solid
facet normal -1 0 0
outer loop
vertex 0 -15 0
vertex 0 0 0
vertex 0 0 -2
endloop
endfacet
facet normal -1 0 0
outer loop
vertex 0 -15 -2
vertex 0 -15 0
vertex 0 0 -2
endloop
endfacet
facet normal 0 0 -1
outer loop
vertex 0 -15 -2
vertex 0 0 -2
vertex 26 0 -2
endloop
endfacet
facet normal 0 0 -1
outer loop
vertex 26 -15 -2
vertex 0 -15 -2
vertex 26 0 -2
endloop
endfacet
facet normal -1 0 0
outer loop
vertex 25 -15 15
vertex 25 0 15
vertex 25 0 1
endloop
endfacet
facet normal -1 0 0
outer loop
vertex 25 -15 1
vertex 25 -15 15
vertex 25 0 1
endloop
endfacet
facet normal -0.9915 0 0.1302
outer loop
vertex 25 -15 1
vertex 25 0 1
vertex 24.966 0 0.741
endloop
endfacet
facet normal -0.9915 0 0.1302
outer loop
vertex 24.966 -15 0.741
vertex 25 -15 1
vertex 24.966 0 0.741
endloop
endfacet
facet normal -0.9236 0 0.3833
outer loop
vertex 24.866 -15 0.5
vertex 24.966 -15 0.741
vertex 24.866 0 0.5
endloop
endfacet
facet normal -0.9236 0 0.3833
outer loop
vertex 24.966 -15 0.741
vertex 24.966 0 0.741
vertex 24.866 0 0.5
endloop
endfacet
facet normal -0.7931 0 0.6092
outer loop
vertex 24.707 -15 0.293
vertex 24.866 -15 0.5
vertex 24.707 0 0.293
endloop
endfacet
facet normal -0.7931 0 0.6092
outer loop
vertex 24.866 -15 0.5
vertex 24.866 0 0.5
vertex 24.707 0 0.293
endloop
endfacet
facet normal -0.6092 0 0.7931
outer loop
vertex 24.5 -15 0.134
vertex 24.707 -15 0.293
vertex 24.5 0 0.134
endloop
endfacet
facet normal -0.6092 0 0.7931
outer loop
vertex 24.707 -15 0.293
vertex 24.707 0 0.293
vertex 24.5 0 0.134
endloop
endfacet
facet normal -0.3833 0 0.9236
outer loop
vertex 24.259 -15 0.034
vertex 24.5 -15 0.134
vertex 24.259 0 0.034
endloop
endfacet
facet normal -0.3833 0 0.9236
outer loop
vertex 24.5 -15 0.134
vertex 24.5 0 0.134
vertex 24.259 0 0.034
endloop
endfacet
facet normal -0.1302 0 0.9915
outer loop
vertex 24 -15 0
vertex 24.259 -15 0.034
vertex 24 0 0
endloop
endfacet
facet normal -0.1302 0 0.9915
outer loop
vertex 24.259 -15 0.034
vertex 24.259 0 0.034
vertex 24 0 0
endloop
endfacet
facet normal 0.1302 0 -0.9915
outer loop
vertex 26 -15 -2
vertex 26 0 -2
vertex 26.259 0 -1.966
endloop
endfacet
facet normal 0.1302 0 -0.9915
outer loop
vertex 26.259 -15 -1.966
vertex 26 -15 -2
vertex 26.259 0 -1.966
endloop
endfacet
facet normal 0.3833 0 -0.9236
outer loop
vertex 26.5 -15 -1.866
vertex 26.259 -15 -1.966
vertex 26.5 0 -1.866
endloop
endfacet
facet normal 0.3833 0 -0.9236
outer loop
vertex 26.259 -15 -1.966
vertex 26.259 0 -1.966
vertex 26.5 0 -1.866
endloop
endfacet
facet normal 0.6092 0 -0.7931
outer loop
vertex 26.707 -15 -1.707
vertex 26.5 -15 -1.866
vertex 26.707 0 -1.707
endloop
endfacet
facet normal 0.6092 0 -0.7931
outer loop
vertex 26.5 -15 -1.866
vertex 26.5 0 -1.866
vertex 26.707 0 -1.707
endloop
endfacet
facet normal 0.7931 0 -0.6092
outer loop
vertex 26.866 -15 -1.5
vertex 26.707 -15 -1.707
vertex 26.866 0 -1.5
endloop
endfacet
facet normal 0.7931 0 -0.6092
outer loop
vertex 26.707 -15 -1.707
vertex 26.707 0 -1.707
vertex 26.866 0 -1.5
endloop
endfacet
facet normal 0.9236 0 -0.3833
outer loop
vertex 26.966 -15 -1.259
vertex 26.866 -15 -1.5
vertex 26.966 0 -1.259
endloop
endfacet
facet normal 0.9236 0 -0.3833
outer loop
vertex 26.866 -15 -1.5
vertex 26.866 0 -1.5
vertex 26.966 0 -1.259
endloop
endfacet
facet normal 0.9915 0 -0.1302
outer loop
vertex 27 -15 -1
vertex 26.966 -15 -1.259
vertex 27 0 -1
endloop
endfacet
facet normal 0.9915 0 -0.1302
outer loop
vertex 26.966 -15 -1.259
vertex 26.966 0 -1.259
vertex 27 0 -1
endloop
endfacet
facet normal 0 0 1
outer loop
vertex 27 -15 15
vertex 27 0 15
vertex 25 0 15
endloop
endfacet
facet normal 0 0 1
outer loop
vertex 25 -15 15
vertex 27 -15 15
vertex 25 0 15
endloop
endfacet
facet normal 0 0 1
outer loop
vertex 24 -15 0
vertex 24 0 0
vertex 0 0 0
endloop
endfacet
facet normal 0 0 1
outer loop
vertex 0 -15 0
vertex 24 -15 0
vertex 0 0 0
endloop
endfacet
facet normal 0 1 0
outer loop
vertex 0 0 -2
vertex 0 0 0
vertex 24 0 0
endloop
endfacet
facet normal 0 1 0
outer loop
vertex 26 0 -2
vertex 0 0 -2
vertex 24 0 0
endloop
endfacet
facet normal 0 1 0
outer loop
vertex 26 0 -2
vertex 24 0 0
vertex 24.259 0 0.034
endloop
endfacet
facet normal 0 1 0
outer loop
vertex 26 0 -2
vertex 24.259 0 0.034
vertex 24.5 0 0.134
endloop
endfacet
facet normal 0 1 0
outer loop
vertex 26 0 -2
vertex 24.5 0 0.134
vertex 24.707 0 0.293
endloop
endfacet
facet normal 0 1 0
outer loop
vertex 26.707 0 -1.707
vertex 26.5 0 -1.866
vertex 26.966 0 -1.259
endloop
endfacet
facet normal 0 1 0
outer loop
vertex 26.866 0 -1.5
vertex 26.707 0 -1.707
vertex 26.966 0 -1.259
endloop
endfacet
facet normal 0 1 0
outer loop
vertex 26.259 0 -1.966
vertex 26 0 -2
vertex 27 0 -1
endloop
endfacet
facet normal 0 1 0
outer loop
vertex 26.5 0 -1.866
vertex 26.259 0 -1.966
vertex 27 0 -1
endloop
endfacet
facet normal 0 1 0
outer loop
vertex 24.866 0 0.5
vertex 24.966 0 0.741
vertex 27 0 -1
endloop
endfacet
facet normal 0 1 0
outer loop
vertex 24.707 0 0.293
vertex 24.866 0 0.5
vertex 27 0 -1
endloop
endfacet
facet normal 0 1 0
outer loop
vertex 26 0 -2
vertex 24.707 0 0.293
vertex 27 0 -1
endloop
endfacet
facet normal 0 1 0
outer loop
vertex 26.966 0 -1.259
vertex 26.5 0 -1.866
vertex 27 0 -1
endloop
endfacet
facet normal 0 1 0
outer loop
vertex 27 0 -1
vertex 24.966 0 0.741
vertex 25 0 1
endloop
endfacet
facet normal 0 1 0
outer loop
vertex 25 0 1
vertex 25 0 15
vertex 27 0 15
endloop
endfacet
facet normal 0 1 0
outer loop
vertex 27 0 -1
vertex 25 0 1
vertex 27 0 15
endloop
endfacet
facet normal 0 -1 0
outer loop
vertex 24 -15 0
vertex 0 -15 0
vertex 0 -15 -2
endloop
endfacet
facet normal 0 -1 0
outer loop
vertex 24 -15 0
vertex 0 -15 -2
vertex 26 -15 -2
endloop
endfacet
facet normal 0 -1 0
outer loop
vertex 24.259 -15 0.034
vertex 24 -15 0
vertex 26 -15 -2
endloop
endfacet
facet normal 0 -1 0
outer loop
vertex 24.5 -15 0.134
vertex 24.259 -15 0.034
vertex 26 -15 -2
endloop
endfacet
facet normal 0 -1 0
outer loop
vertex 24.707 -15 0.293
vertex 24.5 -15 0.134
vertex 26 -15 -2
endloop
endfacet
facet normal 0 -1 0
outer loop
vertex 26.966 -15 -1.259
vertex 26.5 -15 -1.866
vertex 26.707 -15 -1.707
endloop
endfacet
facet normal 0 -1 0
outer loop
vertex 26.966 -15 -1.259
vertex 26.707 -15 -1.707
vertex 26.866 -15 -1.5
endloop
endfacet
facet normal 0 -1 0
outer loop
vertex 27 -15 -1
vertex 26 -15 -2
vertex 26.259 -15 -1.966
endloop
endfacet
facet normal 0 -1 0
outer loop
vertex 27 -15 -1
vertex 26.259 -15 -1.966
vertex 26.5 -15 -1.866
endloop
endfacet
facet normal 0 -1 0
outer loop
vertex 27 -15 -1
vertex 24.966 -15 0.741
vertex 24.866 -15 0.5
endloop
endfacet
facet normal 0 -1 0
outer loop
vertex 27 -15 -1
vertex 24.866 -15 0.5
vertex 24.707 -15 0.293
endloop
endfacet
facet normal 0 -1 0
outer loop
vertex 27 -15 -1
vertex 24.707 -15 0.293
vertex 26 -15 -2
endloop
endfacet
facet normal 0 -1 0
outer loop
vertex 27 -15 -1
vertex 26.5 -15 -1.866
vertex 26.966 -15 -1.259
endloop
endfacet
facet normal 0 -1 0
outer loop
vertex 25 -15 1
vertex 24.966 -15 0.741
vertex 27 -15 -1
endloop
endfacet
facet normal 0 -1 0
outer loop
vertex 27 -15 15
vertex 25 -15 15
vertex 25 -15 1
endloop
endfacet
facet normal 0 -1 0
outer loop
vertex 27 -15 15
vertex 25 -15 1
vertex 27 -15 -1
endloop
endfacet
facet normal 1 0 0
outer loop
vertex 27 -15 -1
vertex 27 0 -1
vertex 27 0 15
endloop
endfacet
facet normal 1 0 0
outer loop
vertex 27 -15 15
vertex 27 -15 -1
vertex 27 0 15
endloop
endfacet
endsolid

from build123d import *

# Parameters (mm, degrees)
F1_DEPTH = 15


with BuildPart() as f1:
    # F0 (on Front) → F1 (new body)
    with BuildSketch(Plane.XZ):
        with BuildLine():
            Line((24, 0), (0, 0))
            Line((0, 0), (0, -2))
            Line((0, -2), (26, -2))
            ThreePointArc((26, -2), (26.707107, -1.707107), (27, -1))
            Line((27, -1), (27, 0))
            Line((27, 0), (27, 15))
            Line((27, 15), (25, 15))
            Line((25, 15), (25, 1))
            ThreePointArc((25, 1), (24.707107, 0.292893), (24, 0))
        make_face()
    extrude(amount=F1_DEPTH)


solid = f1.part
